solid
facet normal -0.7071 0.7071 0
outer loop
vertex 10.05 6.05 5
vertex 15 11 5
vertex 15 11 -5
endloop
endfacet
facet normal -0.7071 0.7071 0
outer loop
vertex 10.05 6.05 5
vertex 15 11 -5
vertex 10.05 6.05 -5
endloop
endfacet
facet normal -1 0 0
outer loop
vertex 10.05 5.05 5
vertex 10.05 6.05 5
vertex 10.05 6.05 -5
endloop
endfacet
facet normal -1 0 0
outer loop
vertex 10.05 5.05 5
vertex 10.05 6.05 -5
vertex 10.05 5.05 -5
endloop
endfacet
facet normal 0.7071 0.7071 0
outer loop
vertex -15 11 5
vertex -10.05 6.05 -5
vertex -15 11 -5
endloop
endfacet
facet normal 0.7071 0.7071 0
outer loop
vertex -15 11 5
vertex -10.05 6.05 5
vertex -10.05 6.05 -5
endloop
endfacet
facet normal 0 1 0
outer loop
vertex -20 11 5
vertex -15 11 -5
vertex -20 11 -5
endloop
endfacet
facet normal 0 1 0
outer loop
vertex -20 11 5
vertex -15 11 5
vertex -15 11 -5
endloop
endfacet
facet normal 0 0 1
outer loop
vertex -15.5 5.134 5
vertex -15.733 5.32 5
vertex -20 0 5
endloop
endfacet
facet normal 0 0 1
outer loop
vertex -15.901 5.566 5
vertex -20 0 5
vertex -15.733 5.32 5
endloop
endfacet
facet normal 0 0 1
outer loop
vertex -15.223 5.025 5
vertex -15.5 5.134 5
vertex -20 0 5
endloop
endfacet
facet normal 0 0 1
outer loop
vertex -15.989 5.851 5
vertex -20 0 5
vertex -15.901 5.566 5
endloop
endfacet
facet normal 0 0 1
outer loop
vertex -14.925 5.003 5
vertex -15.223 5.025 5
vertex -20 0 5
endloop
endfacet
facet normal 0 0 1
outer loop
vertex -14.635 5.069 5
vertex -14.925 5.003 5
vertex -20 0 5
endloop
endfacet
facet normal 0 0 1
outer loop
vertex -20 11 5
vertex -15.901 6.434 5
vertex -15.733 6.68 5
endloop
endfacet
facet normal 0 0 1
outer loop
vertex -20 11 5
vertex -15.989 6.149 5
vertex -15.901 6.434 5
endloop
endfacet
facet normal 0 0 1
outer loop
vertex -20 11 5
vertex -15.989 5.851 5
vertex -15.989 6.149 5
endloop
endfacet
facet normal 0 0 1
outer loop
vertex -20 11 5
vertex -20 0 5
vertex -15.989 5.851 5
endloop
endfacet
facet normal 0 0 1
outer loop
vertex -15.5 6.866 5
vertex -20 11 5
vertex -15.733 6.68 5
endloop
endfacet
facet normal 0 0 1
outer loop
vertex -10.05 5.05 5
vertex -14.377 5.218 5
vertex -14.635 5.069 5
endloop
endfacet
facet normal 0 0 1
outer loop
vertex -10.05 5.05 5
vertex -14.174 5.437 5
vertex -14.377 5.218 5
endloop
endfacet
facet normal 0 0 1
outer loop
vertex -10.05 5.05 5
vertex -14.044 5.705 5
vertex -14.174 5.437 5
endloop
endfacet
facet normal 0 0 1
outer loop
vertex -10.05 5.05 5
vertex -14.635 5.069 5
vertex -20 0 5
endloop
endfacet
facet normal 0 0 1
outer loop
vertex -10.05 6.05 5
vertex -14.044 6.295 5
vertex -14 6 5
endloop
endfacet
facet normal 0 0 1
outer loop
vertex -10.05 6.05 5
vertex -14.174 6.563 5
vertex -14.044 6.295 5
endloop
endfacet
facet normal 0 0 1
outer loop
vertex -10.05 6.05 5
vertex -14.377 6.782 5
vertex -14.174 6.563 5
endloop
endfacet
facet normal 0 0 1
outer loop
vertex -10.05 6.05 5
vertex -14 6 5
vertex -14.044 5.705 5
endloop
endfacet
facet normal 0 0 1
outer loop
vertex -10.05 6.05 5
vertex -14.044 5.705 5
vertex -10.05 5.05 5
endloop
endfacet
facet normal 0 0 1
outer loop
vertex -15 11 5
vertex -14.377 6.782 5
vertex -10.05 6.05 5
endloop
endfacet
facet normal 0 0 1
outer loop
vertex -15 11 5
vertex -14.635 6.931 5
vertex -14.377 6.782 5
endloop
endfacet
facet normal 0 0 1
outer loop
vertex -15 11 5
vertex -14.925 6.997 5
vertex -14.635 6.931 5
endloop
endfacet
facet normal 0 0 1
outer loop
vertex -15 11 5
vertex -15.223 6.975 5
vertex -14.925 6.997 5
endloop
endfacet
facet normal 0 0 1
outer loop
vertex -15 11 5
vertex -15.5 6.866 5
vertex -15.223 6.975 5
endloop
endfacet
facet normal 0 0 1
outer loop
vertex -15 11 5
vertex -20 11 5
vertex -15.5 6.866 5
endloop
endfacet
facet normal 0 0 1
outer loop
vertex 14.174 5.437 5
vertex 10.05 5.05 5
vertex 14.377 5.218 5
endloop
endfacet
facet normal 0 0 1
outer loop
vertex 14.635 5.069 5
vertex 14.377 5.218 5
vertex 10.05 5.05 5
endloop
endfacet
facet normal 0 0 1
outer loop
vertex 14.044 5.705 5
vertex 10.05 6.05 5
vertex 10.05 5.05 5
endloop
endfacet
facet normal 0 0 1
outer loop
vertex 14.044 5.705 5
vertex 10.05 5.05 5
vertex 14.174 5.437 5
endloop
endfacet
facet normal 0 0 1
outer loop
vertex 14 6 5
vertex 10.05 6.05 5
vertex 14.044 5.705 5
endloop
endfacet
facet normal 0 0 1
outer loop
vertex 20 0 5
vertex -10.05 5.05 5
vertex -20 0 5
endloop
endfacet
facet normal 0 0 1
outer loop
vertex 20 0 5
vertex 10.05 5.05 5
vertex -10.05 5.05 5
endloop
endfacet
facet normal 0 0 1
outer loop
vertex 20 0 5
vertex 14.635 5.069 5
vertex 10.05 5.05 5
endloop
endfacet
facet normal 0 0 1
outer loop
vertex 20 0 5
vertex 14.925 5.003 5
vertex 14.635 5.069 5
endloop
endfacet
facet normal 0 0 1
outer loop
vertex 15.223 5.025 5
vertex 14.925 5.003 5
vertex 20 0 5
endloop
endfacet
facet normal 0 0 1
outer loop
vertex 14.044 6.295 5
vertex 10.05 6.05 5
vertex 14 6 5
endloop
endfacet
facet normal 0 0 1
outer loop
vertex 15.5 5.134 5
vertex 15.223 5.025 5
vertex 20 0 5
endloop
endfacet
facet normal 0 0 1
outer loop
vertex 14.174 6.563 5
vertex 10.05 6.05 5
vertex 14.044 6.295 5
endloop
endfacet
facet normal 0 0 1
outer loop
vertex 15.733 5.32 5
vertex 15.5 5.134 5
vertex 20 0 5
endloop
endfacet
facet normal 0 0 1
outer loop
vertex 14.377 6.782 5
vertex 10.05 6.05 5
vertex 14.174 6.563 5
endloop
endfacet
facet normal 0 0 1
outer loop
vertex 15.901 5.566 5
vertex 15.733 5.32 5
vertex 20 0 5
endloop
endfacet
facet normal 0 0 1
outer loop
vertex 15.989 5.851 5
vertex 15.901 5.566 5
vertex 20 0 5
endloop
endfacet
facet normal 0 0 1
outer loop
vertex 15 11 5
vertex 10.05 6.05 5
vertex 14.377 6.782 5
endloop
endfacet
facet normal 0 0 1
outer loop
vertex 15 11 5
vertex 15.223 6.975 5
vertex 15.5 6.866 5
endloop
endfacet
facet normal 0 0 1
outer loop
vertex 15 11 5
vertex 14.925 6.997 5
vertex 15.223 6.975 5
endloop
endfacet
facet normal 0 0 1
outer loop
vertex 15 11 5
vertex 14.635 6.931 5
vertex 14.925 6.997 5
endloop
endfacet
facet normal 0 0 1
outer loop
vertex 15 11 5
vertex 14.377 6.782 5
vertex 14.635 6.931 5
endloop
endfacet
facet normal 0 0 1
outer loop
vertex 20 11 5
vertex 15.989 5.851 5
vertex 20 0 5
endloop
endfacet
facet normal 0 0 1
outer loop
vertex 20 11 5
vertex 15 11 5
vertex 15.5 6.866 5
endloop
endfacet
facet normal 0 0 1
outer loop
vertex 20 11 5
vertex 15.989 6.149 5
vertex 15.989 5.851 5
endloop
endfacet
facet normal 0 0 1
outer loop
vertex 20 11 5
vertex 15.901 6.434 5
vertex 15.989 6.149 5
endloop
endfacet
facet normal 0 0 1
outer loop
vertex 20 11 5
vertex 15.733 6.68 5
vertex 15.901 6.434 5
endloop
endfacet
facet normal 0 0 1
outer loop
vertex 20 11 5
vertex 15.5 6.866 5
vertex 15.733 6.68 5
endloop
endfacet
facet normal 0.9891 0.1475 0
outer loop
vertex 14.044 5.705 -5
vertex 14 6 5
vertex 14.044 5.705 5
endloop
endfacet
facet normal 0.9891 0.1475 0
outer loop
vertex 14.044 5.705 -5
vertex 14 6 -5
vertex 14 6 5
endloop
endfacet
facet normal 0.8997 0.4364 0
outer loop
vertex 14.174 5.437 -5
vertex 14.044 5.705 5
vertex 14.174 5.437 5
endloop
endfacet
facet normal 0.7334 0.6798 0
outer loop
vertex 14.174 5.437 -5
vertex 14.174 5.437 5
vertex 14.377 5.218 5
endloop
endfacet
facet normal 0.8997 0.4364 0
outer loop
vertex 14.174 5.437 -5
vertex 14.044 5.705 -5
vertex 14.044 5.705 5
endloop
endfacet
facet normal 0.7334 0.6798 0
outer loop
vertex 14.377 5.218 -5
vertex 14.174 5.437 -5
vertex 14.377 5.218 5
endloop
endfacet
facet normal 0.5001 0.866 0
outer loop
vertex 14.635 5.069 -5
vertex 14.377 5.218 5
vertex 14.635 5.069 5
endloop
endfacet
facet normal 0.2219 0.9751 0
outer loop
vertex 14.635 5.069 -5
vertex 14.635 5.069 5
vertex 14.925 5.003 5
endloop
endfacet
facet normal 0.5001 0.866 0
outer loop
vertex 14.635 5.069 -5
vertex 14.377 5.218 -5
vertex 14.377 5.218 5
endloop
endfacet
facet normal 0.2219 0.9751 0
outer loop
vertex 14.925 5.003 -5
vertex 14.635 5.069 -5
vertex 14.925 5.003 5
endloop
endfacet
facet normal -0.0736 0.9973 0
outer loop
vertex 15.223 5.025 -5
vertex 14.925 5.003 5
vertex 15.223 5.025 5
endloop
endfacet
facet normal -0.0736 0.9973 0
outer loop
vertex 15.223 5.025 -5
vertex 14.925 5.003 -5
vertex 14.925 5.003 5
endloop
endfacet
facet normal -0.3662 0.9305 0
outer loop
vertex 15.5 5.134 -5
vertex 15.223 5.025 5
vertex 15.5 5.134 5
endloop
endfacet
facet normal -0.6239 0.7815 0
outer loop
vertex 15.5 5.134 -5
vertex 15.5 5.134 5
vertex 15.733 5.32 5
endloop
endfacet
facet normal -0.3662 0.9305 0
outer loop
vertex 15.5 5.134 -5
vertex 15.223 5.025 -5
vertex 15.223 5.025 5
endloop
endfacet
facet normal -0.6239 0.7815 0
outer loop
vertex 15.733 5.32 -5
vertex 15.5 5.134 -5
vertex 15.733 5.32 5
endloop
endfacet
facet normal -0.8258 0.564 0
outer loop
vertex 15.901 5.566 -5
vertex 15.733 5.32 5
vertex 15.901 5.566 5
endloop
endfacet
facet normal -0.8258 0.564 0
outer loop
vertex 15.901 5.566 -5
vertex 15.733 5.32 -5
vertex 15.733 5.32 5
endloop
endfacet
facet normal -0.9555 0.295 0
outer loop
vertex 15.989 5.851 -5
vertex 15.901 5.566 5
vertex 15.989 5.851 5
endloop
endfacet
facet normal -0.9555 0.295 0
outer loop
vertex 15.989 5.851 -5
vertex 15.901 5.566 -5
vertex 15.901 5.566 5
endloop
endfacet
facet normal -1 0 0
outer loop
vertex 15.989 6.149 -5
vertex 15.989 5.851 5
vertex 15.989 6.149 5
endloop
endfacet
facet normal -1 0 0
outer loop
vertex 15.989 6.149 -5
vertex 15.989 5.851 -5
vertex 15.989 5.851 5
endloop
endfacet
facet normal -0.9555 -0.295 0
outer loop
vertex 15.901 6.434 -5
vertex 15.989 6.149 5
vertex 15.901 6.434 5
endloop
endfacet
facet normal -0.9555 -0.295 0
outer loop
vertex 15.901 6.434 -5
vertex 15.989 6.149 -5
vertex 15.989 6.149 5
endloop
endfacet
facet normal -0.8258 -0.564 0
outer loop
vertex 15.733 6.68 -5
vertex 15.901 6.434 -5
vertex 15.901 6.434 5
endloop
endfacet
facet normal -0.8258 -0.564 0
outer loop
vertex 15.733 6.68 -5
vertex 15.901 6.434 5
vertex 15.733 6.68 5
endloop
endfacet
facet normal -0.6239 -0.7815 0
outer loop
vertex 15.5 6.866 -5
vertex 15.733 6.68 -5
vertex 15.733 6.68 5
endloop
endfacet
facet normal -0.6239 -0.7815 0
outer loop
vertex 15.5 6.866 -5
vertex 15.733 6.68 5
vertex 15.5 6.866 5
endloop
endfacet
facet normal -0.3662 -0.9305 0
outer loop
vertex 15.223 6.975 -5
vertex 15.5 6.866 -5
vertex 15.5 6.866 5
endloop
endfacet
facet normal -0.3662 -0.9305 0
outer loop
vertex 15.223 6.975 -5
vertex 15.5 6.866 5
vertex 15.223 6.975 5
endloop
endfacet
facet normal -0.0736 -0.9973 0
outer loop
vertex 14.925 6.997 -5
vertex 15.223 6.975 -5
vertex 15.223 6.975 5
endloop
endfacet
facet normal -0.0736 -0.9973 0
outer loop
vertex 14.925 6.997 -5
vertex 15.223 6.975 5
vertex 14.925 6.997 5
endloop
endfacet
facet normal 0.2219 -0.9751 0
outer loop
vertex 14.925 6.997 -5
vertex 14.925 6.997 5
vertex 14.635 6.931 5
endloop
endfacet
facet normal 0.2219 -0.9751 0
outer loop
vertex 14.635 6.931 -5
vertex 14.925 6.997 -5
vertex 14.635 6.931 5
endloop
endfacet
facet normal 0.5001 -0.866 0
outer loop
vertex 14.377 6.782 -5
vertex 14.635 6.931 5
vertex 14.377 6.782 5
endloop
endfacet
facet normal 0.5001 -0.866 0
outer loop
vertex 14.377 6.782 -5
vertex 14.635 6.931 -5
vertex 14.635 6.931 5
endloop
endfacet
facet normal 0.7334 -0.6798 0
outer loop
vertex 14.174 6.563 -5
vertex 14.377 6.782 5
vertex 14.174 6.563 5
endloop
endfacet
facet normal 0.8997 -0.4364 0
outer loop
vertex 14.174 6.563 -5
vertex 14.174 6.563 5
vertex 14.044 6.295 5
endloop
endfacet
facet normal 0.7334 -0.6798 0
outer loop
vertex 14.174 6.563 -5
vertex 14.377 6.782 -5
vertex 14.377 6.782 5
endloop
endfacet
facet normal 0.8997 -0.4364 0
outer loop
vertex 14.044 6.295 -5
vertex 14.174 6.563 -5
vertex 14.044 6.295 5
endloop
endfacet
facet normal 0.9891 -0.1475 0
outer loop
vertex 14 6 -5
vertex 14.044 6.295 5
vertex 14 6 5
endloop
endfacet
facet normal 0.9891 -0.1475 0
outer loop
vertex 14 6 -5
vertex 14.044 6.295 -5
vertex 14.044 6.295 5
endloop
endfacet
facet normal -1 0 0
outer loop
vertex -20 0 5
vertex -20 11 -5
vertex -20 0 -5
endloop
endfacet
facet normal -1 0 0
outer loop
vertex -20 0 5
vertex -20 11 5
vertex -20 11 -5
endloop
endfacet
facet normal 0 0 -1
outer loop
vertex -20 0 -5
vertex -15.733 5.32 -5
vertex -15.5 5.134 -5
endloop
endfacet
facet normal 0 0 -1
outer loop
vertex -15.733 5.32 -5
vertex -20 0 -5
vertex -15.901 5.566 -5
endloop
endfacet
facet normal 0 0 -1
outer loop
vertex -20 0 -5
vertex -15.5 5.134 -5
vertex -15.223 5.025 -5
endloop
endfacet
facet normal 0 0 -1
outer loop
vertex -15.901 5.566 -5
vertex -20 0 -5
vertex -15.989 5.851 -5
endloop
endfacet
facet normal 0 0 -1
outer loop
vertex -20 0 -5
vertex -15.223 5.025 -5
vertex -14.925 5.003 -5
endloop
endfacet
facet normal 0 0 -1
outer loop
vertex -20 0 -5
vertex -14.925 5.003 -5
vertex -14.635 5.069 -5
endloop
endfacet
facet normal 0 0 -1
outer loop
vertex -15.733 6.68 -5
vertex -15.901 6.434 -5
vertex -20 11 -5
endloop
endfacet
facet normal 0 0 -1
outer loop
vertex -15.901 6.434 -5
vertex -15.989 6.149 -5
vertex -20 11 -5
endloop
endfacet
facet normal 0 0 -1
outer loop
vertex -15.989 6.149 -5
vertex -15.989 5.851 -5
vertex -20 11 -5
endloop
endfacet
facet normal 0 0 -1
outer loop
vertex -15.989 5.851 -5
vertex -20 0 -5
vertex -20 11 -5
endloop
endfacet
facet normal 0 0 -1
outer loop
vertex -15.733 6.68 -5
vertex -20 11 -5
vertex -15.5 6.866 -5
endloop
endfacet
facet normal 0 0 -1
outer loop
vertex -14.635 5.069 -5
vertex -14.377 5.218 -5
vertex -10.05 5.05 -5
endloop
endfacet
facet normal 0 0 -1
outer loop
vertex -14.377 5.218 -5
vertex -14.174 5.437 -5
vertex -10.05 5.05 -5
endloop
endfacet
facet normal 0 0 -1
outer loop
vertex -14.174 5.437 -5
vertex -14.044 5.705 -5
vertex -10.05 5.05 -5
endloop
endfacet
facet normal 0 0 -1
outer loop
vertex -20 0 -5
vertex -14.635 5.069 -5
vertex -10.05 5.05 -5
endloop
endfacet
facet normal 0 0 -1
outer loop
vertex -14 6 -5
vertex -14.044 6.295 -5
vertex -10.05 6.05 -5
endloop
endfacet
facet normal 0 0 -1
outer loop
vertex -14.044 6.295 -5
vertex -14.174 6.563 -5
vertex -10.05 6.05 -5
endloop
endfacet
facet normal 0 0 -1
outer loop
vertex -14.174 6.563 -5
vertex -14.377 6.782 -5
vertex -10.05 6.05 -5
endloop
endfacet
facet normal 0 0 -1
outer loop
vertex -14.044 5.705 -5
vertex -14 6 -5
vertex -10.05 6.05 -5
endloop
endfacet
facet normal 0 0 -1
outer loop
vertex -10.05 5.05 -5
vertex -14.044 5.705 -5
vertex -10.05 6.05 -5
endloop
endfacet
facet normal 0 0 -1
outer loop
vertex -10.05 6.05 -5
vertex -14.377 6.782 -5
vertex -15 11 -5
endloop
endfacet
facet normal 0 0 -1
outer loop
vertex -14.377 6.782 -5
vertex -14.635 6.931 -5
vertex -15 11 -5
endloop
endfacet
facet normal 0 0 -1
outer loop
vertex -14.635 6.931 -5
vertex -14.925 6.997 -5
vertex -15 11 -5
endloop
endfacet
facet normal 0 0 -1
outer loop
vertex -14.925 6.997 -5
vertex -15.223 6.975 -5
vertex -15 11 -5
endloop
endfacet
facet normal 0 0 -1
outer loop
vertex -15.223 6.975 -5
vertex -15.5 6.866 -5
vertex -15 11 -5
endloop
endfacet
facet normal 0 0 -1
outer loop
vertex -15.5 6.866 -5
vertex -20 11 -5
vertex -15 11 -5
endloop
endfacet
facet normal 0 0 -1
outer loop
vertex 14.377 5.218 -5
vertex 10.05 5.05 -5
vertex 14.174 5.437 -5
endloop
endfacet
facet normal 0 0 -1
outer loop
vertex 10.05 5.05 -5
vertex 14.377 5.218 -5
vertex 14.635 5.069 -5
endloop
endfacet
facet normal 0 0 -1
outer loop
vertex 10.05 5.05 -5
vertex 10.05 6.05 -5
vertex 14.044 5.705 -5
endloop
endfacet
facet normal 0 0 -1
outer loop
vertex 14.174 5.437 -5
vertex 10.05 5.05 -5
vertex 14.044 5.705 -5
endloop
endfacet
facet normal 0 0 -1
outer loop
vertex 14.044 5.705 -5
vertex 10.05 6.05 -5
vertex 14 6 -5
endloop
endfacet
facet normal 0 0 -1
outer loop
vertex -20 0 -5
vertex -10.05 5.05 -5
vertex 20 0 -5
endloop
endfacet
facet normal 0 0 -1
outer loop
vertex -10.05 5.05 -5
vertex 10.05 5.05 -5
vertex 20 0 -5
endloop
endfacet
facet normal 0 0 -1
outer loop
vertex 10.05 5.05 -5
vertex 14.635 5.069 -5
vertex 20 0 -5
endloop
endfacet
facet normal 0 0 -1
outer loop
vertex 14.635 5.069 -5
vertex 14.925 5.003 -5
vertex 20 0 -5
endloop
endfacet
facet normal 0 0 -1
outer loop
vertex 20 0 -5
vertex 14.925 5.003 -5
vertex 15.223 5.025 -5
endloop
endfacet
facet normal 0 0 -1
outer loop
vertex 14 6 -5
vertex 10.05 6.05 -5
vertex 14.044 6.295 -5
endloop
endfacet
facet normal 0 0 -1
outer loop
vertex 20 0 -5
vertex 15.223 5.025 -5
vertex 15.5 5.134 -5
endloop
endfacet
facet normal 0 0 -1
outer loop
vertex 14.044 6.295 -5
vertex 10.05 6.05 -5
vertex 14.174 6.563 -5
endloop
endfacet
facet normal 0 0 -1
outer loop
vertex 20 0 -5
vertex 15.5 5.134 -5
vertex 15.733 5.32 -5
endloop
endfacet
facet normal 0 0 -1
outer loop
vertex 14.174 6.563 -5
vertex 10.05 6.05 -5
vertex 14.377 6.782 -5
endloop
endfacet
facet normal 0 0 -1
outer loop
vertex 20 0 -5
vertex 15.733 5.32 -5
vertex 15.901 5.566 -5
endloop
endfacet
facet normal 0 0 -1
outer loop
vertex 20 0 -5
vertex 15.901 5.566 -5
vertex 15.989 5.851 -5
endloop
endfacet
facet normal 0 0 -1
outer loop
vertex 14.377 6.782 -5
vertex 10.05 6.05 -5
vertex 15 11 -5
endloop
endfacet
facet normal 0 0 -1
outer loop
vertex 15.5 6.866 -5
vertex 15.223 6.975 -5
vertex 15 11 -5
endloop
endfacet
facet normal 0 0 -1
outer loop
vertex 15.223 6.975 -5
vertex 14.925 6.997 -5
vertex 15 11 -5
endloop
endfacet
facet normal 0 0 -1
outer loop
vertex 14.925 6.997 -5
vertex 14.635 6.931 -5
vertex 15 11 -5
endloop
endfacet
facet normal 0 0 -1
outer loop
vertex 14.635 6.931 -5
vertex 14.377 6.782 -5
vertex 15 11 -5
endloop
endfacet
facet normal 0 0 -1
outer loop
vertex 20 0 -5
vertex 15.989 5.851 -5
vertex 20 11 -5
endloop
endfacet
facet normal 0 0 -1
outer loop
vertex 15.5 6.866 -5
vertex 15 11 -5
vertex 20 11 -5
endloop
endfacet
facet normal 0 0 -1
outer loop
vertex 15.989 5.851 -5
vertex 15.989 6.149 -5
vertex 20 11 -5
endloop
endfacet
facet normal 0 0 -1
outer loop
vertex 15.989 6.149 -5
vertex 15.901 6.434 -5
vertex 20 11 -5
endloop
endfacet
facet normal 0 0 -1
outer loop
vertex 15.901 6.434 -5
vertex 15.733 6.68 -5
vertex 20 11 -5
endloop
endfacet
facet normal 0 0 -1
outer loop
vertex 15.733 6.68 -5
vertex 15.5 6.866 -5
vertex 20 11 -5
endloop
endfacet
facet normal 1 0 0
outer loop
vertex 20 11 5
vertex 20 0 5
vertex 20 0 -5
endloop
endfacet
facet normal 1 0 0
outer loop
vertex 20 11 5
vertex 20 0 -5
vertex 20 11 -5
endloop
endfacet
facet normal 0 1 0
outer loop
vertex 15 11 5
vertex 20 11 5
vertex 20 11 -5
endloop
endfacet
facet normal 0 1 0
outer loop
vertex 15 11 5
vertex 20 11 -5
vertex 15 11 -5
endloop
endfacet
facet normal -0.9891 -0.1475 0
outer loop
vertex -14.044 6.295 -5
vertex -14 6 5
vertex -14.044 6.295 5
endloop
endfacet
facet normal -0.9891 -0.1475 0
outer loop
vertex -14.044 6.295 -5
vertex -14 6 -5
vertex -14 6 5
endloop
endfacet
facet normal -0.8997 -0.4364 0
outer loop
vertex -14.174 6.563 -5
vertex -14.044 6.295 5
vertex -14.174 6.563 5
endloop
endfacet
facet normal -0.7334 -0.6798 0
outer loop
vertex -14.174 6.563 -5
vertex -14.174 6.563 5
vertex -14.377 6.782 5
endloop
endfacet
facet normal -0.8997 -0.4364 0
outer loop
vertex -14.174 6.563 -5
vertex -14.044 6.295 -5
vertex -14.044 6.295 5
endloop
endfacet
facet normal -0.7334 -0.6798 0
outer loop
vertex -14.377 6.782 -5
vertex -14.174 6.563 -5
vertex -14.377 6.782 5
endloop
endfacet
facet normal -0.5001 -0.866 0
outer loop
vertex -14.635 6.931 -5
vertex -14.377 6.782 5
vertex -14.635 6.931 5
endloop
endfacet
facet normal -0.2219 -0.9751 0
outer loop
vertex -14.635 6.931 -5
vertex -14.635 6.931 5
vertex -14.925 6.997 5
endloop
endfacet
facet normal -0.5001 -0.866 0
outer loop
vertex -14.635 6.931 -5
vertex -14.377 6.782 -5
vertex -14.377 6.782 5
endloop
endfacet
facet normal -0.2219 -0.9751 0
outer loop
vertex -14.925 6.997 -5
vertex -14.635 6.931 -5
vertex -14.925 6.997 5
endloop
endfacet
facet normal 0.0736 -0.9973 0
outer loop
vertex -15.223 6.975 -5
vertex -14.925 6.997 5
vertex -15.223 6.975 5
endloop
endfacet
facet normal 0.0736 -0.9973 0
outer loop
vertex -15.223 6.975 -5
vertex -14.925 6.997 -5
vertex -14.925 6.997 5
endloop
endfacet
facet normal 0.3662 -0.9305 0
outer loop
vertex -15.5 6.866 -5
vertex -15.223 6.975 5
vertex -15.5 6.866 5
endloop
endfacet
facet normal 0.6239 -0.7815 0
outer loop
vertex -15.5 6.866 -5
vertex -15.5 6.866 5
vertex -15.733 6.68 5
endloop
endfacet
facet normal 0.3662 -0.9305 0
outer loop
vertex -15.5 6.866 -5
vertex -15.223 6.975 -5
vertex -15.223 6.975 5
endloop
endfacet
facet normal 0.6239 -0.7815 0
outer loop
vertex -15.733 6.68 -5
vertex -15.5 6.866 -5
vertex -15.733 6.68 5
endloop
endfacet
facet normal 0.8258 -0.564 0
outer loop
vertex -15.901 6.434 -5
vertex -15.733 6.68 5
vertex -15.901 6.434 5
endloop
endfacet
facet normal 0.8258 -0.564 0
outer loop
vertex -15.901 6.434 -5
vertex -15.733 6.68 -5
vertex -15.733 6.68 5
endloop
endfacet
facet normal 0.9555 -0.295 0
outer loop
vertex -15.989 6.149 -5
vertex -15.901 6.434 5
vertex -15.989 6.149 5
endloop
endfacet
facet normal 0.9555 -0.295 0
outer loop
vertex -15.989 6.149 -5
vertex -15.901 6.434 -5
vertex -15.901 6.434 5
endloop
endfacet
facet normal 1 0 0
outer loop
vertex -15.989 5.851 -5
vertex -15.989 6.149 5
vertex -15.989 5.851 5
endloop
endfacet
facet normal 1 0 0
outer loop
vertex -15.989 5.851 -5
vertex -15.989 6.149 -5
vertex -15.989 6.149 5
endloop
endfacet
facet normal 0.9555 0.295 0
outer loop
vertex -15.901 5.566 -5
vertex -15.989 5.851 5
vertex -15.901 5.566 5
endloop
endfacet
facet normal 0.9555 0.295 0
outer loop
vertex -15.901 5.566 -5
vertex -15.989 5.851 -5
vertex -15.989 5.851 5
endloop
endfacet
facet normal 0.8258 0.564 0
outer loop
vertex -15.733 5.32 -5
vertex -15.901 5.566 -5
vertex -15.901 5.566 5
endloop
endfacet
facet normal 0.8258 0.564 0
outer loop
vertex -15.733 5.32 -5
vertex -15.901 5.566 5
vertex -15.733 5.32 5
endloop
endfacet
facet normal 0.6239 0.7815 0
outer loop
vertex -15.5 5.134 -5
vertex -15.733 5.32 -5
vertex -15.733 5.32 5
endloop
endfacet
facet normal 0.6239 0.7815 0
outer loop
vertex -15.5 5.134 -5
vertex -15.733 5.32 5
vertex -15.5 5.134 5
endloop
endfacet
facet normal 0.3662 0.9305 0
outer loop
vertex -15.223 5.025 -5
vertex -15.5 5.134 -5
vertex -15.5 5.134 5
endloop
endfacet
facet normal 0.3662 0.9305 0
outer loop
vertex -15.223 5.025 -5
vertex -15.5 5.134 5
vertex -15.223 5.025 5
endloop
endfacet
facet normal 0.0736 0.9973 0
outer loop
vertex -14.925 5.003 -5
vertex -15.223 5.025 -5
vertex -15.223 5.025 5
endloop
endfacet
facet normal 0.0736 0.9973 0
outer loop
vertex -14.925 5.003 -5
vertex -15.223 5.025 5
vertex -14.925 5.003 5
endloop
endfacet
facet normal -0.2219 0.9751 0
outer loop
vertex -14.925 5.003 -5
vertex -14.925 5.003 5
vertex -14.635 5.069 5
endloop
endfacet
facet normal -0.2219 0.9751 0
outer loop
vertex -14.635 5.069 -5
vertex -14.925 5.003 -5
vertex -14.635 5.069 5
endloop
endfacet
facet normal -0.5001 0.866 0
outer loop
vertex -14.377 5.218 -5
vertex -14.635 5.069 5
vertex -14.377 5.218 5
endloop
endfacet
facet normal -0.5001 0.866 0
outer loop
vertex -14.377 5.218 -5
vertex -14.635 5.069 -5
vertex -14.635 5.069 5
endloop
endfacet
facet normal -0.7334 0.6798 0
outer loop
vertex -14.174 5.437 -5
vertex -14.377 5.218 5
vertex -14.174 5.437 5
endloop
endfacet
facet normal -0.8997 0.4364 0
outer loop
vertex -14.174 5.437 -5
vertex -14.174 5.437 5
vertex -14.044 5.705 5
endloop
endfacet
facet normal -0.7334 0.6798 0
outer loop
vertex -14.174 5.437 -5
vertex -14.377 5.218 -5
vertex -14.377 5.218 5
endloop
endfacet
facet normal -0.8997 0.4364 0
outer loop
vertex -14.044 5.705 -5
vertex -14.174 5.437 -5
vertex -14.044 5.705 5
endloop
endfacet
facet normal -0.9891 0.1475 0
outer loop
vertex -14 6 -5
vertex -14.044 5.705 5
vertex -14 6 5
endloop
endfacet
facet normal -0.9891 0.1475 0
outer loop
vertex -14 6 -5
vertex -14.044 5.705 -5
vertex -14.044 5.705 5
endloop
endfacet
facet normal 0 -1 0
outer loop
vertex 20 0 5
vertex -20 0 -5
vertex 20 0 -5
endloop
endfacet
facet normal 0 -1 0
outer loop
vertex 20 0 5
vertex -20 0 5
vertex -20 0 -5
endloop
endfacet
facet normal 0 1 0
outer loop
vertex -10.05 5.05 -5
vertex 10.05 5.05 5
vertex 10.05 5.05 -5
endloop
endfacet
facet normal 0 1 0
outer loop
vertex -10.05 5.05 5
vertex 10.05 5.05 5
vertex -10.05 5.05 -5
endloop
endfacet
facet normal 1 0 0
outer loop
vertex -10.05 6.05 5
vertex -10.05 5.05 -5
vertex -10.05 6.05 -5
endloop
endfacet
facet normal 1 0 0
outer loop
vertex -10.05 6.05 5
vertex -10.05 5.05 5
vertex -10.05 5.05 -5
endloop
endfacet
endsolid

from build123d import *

# Parameters (mm, degrees)
SKETCH1_R           = 1
BOSS_EXTRUDE1_DEPTH = 5


with BuildPart() as part:
    # Sketch1 → Boss-Extrude1 (new, symmetric)
    with BuildSketch(Plane.XY):
        Polygon((-20, 0), (20, 0), (20, 11), (15, 11), (10.050252532, 6.050252532), (10.050252532, 5.050252532), (-10.050252532, 5.050252532), (-10.050252532, 6.050252532), (-15, 11), (-20, 11), align=None)
        with Locations((-15, 6)):
            Circle(SKETCH1_R, mode=Mode.SUBTRACT)
        with Locations(Location((15, 6, 0), (0, 0, 180))):
            Circle(SKETCH1_R, mode=Mode.SUBTRACT)
    extrude(amount=BOSS_EXTRUDE1_DEPTH, both=True)


solid = part.part
